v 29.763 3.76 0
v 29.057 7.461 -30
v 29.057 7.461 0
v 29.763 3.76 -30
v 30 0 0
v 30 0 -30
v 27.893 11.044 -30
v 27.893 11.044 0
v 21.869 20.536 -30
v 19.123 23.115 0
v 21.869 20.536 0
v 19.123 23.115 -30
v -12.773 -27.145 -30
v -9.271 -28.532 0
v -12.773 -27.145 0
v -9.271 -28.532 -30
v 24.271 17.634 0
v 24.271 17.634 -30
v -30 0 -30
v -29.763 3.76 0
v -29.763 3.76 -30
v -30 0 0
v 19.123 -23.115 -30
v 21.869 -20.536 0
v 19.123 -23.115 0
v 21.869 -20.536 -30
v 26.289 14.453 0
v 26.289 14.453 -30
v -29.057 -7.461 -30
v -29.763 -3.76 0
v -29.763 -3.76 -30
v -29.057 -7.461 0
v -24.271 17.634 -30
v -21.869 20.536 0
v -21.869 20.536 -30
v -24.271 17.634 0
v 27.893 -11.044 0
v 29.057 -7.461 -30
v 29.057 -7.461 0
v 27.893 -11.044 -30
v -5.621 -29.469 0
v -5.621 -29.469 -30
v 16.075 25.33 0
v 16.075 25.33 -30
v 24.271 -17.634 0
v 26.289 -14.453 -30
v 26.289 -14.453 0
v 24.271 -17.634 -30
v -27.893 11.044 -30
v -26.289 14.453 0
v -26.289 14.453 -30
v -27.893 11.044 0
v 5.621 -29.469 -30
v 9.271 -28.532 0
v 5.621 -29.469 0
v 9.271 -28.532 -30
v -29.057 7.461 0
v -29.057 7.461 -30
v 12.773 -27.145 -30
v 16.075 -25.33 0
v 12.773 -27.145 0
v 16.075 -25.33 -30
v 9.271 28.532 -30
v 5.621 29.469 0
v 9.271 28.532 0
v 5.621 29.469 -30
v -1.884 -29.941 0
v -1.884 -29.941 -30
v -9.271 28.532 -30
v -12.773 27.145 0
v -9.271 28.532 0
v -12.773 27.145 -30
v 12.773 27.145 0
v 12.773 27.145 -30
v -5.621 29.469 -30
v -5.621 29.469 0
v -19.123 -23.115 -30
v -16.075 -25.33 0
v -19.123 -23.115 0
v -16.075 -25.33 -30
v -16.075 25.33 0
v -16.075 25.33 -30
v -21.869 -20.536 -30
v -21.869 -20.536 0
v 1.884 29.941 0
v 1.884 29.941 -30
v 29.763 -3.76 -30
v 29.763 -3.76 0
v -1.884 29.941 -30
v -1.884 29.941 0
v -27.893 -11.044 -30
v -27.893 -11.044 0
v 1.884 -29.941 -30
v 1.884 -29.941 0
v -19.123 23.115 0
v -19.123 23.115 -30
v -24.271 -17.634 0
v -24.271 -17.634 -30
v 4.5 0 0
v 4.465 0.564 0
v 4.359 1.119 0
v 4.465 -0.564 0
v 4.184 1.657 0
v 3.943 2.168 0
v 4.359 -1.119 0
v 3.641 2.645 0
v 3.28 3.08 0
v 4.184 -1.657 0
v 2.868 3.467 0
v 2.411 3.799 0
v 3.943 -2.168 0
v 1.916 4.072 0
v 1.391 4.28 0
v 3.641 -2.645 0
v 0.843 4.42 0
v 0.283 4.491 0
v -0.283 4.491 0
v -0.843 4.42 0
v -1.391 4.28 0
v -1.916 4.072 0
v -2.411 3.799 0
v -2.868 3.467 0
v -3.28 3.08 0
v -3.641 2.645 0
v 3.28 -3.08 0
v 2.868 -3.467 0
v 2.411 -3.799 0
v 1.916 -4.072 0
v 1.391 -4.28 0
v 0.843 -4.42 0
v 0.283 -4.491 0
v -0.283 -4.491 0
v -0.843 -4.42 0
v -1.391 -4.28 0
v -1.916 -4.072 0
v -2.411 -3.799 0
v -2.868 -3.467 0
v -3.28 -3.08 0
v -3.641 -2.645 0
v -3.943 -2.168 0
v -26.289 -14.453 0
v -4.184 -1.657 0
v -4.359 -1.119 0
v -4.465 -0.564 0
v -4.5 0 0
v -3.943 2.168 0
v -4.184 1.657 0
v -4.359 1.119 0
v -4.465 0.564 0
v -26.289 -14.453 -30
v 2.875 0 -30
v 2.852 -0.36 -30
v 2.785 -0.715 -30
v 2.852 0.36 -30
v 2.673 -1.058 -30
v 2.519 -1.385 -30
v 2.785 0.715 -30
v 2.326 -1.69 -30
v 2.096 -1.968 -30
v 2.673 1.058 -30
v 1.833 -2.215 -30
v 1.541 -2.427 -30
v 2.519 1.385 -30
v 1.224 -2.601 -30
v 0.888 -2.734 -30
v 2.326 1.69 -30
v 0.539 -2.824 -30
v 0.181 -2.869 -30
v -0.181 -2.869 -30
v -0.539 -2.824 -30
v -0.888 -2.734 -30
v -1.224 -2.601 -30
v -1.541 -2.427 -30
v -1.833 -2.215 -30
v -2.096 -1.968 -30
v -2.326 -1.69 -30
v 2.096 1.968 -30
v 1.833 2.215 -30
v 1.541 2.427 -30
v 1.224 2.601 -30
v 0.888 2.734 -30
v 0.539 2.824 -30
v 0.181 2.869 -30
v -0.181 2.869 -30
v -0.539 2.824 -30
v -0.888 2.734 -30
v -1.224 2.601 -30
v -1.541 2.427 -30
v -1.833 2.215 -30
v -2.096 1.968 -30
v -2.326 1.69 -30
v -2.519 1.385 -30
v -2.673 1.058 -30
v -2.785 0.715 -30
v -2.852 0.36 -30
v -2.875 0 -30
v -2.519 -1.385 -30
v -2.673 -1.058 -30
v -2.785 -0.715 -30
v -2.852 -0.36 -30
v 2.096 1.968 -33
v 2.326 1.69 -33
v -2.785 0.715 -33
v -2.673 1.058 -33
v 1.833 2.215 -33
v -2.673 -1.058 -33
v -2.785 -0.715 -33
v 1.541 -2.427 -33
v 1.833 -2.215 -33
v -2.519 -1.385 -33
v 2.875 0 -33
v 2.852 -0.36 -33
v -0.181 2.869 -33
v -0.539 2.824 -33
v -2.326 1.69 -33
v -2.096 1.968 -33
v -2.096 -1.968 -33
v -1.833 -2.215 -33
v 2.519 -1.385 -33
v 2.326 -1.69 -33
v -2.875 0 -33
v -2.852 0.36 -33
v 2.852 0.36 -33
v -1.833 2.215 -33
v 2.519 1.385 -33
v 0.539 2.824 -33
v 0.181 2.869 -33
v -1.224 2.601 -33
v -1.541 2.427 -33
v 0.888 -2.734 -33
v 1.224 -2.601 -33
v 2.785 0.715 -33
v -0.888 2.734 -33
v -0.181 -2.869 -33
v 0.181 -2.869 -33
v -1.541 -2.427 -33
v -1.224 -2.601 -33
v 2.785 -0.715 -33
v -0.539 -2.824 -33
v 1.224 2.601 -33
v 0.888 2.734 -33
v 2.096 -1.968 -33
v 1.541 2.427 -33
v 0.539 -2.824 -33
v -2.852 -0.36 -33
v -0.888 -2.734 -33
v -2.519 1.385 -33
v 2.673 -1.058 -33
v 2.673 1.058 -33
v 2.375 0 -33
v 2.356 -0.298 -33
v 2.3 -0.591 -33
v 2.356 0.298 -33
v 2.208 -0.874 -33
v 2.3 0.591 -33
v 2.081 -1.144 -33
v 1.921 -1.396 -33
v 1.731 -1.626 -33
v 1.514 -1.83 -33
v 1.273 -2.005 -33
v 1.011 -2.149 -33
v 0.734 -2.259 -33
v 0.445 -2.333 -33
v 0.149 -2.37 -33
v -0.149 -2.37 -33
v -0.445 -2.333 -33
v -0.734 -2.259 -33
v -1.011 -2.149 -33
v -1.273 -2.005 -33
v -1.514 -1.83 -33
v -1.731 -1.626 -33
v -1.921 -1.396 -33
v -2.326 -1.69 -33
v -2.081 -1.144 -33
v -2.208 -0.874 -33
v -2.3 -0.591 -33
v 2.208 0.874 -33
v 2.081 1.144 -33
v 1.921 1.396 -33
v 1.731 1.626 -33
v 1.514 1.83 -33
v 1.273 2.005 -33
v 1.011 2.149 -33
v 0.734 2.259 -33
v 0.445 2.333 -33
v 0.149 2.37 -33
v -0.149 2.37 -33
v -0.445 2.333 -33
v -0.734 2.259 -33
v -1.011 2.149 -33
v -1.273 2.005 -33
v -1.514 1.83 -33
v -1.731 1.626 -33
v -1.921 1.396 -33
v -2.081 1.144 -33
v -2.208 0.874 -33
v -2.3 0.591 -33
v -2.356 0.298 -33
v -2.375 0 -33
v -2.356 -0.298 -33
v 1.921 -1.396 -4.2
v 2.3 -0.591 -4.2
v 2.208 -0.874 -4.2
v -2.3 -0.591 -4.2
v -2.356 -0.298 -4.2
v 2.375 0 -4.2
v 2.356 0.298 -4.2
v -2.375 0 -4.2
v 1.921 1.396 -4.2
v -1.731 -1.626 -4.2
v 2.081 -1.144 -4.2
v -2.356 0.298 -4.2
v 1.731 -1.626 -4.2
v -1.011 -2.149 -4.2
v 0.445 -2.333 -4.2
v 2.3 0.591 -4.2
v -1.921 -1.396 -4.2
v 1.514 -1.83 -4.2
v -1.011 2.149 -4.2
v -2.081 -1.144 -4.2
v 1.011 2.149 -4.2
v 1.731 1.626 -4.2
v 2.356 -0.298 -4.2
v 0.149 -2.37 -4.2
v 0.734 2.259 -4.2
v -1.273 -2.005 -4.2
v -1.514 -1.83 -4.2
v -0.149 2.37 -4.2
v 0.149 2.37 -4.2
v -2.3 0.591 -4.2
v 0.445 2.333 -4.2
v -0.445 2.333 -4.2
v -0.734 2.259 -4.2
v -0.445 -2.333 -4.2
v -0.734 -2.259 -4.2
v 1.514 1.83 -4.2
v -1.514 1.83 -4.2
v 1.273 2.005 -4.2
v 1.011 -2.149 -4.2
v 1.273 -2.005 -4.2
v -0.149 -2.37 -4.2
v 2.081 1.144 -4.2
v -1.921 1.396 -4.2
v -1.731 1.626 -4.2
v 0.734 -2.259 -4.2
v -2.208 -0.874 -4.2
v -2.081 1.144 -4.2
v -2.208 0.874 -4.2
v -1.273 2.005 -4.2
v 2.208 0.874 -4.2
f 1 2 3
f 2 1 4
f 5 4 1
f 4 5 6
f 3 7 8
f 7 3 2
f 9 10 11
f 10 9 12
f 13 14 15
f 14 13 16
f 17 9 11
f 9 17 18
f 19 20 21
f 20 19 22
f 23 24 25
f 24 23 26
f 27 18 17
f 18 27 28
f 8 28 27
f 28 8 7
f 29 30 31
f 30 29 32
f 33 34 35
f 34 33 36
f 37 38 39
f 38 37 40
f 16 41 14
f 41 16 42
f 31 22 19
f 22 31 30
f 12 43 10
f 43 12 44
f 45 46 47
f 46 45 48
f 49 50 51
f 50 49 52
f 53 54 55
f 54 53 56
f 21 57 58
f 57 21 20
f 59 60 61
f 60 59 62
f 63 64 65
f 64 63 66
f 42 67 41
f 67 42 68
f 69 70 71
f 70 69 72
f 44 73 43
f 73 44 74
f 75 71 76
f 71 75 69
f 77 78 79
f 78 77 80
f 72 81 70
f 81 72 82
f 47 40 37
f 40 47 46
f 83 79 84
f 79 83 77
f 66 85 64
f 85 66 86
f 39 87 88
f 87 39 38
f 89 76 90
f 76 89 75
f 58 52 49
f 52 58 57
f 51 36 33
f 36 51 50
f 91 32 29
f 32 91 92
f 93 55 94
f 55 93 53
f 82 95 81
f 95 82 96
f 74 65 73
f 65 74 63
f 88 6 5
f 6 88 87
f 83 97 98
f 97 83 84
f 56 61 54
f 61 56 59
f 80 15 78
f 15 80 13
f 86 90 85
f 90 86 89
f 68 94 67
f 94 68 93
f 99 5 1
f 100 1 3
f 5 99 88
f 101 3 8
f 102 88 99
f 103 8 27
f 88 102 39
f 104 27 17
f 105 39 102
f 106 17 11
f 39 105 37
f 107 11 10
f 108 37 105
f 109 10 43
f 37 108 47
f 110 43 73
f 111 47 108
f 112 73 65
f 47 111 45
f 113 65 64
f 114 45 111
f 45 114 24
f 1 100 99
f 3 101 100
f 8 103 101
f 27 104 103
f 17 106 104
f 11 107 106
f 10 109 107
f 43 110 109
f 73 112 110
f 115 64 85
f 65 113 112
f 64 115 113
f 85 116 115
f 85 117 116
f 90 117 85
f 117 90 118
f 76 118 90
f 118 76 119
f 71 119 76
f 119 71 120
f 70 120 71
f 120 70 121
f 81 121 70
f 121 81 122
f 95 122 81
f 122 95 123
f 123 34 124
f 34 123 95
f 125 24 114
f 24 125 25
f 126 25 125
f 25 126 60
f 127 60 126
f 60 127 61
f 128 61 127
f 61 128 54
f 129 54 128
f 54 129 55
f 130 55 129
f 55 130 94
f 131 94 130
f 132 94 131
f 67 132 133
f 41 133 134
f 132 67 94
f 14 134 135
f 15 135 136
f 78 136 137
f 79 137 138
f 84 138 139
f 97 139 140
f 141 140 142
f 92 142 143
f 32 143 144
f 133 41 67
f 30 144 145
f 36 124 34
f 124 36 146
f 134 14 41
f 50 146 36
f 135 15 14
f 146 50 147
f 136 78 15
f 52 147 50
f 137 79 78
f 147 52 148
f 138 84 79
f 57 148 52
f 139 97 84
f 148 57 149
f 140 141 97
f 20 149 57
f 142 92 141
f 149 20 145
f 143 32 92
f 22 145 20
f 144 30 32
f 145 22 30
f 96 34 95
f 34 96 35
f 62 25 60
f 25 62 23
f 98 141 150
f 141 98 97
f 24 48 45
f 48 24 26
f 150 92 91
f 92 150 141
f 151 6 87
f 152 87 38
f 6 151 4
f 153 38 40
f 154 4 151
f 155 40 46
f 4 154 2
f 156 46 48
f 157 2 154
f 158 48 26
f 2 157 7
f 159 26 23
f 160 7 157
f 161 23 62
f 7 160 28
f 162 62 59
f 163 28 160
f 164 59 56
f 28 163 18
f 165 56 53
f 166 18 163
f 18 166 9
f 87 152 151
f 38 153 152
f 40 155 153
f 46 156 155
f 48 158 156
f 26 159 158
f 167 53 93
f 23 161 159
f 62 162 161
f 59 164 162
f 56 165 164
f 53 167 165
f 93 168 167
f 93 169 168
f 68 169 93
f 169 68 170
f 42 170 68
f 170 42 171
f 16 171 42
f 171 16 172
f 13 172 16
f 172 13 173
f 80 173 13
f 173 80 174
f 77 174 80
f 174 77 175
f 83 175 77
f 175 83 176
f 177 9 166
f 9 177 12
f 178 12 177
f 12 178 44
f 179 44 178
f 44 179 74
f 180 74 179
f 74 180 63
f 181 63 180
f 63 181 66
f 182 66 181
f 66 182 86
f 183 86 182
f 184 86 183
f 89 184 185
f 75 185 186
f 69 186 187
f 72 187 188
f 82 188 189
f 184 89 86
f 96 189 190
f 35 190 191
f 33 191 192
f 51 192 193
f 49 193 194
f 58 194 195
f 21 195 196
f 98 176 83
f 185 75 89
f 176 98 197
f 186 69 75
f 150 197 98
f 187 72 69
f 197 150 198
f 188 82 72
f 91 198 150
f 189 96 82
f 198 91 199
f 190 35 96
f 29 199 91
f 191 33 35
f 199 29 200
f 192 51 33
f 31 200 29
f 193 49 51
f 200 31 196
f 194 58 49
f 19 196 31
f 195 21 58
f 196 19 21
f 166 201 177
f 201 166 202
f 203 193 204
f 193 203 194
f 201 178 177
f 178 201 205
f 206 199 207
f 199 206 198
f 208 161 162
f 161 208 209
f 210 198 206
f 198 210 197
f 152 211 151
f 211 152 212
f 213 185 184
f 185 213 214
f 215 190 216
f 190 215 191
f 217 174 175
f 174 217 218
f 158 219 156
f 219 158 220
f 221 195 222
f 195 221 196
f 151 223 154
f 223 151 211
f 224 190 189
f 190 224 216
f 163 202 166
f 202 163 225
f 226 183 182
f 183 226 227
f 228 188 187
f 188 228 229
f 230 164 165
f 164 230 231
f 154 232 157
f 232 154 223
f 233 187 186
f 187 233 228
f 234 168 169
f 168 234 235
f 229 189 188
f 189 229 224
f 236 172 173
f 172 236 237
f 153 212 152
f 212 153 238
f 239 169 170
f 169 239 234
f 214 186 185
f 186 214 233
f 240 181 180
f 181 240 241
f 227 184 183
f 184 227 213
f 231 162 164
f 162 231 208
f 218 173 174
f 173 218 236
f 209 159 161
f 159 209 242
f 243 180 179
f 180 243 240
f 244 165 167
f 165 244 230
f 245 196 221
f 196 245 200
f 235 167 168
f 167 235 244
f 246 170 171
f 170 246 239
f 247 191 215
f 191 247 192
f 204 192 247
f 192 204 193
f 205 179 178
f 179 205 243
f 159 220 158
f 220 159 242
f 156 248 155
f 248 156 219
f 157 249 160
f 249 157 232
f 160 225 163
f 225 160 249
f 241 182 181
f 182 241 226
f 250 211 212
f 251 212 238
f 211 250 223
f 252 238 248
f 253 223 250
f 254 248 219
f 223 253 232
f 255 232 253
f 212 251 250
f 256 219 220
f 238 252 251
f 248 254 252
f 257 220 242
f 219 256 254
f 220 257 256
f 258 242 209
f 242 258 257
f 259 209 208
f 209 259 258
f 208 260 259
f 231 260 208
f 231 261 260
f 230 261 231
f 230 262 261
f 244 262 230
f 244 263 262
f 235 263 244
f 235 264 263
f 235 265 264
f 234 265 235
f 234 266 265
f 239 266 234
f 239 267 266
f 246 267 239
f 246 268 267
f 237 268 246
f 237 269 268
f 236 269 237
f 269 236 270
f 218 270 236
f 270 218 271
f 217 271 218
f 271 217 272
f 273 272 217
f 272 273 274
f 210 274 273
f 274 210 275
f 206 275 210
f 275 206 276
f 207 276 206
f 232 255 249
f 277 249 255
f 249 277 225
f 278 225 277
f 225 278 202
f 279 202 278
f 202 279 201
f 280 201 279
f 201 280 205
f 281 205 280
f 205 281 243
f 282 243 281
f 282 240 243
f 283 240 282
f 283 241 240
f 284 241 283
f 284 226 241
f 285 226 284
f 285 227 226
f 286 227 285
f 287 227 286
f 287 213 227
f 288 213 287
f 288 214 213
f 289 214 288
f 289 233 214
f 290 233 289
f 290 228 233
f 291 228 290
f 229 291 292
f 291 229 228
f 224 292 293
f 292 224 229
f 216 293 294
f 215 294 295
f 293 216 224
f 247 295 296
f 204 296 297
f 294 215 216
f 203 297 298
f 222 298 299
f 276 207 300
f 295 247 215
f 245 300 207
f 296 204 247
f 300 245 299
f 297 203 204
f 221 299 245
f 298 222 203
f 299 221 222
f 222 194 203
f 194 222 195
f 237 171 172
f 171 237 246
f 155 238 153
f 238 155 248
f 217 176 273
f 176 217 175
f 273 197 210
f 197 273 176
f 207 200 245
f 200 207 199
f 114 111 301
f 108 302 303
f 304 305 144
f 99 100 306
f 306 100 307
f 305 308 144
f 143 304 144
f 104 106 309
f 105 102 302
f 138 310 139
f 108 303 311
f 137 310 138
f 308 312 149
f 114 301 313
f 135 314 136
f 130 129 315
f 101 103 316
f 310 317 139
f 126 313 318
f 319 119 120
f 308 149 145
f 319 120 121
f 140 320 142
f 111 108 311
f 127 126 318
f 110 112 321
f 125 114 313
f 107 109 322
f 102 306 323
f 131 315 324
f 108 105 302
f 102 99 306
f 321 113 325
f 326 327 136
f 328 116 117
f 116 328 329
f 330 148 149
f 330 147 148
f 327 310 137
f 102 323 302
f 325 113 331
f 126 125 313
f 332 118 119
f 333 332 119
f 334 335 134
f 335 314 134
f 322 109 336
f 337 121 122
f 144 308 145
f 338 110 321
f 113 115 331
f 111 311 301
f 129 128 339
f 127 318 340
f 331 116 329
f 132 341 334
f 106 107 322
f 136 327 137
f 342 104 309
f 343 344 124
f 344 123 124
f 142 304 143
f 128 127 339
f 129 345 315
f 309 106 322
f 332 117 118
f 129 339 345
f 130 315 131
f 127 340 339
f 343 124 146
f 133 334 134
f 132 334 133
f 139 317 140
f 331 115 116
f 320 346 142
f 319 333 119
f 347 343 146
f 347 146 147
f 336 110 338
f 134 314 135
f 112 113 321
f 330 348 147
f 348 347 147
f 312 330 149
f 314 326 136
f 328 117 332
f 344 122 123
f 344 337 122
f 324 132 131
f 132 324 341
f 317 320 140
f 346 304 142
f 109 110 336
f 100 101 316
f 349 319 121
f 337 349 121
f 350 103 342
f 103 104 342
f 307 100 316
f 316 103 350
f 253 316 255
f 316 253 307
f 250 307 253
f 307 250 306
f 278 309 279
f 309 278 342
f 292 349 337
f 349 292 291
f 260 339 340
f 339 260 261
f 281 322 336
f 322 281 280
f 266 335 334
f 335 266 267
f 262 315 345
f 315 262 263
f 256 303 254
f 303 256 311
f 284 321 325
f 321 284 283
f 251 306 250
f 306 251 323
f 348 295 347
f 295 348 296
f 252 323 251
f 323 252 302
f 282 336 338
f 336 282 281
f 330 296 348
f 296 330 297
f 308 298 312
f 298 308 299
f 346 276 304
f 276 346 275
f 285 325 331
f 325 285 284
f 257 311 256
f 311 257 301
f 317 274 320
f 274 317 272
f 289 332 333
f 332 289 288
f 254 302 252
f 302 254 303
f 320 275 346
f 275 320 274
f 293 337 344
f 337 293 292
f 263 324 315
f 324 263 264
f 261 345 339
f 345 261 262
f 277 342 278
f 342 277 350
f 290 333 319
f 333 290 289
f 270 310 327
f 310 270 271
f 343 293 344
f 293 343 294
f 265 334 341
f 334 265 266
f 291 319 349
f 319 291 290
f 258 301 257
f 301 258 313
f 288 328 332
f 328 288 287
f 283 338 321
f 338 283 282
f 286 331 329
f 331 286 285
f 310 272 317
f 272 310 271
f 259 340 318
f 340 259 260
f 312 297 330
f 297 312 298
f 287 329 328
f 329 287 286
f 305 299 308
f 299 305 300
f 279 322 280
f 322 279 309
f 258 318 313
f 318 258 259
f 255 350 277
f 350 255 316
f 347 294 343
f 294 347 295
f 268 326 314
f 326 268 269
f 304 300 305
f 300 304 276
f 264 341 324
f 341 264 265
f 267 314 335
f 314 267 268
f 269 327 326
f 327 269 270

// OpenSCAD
$fn = 50;


difference() {
	union() {
		translate(v = [0, 0, -30.0000000000]) {
			cylinder(h = 30, r = 30.0000000000);
		}
		#translate(v = [0, 0, -33.0000000000]) {
			cylinder(h = 33, r = 2.8750000000);
		}
	}
	union() {
		translate(v = [0, 0, 0]) {
			rotate(a = [0, 0, 0]) {
				difference() {
					union() {
						translate(v = [0, 0, -33.0000000000]) {
							cylinder(h = 33, r = 2.2500000000);
						}
						translate(v = [0, 0, -4.2000000000]) {
							cylinder(h = 4.2000000000, r1 = 2.3750000000, r2 = 4.5000000000);
						}
						translate(v = [0, 0, -33.0000000000]) {
							cylinder(h = 33, r = 2.3750000000);
						}
						translate(v = [0, 0, -33.0000000000]) {
							cylinder(h = 33, r = 2.2500000000);
						}
					}
					union();
				}
			}
		}
	}
}
